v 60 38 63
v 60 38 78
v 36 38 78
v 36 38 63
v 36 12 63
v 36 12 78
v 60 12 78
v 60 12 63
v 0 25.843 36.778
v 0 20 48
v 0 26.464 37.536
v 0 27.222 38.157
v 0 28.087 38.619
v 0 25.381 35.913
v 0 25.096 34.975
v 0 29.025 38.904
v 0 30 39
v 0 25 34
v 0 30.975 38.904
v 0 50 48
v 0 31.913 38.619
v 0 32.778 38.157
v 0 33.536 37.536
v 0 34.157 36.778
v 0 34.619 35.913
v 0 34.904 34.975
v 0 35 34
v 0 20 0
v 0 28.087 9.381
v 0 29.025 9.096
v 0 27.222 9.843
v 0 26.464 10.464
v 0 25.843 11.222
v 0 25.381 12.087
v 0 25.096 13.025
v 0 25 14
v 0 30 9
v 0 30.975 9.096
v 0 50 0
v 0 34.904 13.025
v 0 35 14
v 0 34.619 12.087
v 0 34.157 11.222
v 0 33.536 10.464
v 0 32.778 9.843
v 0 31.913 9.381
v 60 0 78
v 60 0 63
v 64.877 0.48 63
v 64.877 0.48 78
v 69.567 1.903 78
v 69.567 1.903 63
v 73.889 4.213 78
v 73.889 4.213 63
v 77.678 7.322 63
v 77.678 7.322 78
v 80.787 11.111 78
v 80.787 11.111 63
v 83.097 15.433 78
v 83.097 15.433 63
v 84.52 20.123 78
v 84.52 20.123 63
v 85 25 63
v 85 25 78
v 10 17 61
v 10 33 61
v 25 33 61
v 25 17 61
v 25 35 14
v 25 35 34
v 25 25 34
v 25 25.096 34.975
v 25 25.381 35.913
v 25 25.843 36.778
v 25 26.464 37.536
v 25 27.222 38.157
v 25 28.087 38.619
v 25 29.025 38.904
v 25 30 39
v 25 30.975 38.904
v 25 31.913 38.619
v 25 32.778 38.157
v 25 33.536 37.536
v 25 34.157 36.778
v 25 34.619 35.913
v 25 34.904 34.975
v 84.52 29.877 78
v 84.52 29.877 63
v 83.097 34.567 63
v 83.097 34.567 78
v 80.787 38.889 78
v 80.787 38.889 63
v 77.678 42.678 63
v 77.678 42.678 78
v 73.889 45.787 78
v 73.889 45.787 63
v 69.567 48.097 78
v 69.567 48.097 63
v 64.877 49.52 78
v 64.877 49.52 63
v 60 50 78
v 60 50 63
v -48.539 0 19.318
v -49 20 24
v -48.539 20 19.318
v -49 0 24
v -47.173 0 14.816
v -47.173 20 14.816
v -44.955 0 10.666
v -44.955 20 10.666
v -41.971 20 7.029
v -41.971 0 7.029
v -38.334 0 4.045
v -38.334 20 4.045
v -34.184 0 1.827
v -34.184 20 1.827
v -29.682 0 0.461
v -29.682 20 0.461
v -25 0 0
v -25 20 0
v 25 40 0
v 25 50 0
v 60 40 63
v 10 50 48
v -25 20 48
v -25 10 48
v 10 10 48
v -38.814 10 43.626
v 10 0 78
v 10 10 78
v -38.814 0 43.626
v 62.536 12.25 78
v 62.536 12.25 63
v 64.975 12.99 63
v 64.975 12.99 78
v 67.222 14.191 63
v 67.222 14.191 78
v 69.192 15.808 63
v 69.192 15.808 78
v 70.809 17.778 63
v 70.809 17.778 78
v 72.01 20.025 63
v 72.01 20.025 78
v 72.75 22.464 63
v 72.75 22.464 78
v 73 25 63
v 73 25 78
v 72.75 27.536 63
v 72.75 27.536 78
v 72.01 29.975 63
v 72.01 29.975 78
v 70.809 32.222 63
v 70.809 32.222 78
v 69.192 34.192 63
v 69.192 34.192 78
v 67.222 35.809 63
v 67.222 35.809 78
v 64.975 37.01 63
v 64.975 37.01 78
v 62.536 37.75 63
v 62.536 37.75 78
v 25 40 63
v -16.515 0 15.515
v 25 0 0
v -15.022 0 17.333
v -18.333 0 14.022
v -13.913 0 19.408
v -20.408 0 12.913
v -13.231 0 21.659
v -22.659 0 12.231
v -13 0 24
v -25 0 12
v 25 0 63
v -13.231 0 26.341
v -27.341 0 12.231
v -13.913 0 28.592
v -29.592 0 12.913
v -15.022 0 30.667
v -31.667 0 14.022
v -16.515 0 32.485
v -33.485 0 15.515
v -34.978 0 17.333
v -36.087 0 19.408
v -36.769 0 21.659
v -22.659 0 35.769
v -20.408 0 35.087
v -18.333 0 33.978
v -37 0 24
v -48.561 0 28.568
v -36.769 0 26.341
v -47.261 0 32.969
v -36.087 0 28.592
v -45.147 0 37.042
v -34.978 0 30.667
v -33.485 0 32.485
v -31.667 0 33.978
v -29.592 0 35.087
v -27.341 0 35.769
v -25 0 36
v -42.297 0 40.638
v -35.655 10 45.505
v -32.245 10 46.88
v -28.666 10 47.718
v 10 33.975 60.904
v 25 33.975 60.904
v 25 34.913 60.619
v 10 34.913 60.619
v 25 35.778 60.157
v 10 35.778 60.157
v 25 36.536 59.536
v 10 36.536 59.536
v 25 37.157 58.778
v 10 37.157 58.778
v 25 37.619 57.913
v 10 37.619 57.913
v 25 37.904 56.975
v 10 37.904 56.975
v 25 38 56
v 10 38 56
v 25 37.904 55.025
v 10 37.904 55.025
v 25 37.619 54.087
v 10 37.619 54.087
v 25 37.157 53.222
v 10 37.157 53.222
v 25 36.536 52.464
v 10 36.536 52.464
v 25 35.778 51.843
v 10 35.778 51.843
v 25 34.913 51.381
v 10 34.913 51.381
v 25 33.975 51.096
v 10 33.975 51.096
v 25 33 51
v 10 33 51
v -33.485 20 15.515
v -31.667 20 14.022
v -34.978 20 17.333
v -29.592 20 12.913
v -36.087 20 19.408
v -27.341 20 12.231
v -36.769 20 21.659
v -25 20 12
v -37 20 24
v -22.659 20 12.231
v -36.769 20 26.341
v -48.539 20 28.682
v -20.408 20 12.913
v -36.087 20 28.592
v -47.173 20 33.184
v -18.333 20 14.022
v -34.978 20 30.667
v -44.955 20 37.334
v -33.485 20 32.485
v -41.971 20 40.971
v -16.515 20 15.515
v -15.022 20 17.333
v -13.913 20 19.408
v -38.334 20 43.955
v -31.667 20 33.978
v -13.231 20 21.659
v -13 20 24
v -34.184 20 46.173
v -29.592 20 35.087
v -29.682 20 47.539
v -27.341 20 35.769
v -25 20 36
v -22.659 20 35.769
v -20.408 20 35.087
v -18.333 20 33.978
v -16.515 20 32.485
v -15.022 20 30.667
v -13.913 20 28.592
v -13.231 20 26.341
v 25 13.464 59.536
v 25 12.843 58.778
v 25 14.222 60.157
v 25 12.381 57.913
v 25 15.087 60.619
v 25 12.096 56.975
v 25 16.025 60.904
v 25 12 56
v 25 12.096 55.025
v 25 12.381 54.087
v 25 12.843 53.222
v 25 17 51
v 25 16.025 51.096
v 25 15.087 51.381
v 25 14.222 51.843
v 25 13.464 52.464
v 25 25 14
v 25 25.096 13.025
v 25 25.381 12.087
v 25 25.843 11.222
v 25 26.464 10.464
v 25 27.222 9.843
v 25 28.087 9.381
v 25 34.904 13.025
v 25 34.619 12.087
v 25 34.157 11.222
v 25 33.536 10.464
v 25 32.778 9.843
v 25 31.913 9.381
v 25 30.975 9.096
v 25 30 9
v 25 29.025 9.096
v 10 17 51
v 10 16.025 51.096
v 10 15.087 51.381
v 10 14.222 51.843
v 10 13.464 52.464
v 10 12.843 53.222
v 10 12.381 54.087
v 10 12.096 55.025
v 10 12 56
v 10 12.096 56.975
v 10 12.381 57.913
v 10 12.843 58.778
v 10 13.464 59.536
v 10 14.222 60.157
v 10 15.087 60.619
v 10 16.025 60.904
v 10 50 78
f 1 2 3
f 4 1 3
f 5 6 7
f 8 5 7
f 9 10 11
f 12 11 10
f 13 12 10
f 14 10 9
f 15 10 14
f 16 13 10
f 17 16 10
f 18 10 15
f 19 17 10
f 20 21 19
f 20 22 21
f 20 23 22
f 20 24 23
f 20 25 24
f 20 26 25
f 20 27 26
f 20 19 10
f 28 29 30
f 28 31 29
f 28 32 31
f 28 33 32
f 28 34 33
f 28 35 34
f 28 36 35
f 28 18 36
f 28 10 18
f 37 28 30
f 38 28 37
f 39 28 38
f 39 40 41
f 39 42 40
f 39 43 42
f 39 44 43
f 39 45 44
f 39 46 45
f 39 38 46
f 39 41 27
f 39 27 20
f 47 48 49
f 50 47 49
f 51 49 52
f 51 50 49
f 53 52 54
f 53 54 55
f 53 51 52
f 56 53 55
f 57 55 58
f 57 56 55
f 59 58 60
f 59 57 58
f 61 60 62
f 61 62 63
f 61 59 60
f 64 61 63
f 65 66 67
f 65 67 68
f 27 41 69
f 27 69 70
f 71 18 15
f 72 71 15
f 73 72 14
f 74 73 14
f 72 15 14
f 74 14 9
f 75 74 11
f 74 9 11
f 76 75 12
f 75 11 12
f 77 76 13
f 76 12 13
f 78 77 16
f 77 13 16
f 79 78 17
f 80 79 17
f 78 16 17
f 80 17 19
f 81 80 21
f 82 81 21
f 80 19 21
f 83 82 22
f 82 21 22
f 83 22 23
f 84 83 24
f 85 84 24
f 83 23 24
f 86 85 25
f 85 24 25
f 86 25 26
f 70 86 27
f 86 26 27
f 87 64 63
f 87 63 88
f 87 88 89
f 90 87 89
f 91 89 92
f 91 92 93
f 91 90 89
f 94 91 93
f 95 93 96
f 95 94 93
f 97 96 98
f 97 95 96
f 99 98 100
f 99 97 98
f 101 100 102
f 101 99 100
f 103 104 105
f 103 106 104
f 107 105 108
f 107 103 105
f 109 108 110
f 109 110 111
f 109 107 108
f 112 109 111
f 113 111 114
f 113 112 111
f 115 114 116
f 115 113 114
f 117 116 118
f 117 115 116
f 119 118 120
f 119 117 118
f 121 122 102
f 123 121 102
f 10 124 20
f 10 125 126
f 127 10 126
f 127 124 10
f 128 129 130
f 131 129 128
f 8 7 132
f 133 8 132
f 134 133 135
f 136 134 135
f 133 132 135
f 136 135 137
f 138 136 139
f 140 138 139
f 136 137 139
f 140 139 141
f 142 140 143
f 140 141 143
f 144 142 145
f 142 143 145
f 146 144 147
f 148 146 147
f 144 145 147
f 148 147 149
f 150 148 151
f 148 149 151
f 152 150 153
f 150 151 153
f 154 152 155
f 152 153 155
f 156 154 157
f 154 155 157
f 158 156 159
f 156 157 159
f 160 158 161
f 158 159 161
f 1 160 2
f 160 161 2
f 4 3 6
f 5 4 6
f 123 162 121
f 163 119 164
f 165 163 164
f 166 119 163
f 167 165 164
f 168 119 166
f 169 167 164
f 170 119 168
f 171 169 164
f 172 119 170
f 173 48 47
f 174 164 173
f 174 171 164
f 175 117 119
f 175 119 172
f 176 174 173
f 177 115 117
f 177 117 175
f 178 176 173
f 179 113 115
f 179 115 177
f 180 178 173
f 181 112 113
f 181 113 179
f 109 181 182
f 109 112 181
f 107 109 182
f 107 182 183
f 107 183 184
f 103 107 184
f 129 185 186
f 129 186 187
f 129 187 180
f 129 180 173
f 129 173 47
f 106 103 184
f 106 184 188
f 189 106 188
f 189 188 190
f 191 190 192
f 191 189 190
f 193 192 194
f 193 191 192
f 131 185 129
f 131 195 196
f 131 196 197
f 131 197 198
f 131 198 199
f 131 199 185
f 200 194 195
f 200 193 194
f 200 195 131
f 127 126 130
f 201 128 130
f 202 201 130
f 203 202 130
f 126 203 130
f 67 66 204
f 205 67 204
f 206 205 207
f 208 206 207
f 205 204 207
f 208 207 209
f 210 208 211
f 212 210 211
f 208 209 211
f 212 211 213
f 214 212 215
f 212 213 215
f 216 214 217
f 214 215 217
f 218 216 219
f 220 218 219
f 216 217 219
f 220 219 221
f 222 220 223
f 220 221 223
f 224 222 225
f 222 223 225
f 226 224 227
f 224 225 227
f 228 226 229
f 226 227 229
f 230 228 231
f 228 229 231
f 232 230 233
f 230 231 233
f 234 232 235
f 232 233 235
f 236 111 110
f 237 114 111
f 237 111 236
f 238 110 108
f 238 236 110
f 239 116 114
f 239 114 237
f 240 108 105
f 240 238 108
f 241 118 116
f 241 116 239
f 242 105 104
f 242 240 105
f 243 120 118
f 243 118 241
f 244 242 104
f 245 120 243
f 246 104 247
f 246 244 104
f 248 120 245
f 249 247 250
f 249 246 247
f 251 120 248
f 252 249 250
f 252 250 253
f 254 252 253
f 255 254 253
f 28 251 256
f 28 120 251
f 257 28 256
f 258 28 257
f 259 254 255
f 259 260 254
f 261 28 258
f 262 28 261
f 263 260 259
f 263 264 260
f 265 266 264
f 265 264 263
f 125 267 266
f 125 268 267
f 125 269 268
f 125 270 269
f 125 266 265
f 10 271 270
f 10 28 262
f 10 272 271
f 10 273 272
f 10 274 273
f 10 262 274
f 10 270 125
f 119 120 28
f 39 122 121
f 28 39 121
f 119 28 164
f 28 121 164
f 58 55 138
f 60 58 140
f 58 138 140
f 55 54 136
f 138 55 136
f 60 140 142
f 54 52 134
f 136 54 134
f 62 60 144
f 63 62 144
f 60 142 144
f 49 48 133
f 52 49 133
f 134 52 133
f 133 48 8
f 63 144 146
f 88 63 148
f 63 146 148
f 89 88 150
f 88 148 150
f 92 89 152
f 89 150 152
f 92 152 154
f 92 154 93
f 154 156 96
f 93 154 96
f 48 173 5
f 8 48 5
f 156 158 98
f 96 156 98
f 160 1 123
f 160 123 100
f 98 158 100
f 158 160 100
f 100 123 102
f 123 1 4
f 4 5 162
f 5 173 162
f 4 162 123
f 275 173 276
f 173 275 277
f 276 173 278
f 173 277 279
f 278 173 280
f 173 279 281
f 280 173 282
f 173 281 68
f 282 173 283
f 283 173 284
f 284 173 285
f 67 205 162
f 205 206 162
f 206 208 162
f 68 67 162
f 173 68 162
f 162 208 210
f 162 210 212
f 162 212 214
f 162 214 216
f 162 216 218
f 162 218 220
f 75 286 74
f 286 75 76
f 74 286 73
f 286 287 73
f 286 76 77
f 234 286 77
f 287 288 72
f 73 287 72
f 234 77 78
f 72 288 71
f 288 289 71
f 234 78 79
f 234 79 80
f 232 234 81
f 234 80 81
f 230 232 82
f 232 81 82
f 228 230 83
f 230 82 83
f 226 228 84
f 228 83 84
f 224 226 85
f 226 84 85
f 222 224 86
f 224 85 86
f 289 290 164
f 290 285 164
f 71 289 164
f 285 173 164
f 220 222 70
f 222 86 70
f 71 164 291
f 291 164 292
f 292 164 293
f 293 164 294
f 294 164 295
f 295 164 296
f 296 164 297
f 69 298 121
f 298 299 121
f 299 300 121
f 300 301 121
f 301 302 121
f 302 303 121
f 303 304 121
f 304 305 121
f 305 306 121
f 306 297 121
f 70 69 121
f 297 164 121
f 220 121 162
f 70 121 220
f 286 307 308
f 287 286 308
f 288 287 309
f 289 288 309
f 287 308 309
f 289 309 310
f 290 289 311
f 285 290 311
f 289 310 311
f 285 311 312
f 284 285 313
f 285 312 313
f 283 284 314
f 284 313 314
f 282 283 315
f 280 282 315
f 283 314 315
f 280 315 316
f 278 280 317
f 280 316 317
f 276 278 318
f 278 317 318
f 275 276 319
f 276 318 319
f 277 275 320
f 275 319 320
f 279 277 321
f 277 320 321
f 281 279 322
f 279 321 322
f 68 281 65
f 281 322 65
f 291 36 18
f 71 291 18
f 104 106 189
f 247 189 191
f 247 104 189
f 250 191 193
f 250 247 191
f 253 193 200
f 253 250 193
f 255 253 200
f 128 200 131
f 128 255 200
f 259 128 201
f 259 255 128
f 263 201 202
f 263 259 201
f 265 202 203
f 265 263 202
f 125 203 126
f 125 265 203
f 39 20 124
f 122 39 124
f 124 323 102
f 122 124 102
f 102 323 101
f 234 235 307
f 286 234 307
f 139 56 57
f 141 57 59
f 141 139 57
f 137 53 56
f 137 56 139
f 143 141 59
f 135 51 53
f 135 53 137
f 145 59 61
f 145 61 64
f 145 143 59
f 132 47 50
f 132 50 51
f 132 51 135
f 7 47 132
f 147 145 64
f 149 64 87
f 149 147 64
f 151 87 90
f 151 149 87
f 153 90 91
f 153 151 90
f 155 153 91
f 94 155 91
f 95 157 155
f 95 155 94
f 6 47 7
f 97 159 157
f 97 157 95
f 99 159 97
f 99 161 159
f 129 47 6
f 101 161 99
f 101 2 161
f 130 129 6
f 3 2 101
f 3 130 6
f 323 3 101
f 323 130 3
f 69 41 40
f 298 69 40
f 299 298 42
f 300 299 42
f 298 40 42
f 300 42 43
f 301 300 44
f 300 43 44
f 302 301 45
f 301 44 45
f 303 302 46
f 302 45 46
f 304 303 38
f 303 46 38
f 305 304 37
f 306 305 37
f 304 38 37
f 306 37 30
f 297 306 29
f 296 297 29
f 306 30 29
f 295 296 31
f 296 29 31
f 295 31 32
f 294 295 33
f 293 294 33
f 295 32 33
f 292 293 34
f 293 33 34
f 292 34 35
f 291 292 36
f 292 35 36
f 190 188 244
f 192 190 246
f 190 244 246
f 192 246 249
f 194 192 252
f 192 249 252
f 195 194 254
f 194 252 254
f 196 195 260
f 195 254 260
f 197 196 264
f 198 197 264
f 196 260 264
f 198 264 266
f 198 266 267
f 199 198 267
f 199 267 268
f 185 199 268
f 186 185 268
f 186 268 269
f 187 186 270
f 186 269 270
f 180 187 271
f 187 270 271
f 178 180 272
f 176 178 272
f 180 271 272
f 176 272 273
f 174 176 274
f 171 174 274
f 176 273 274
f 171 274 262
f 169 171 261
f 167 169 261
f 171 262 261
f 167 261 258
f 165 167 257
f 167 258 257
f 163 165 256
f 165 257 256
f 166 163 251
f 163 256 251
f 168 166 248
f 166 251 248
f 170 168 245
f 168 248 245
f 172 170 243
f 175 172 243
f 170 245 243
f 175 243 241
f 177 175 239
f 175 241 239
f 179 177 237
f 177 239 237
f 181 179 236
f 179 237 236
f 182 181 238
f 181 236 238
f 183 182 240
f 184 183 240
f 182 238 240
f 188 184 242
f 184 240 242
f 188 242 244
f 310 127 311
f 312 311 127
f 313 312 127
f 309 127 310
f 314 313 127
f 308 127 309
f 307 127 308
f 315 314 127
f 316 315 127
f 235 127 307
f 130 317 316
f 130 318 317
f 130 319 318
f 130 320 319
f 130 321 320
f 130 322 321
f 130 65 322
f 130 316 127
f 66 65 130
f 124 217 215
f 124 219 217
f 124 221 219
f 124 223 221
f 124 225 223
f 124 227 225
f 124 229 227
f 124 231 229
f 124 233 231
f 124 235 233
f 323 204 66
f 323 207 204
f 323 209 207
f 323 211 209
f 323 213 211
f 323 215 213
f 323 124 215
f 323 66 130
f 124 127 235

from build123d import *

# Parameters (mm, degrees)
SKETCH_W        = 25
SKETCH_H        = 50
PAD_DEPTH       = 78
SKETCH001_W     = 10
SKETCH001_H     = 30
POCKET_DEPTH    = 50
SKETCH002_W     = 20
SKETCH002_H     = 48
PAD001_DEPTH    = 49
FILLET_R        = 24
POCKET001_DEPTH = 20
SKETCH004_W     = 50
SKETCH004_H     = 15
PAD002_DEPTH    = 60
FILLET001_R     = 25
POCKET002_DEPTH = 15
SKETCH006_R     = 12
POCKET003_DEPTH = 20
POCKET004_DEPTH = 15
POCKET005_DEPTH = 15
POCKET006_DEPTH = 25
PAD003_DEPTH    = 10
PAD004_DEPTH    = 10


with BuildPart() as part:
    # Sketch → Pad (new body)
    with BuildSketch(Plane.XY):
        with Locations((12.5, 25)):
            Rectangle(SKETCH_W, SKETCH_H)
    extrude(amount=PAD_DEPTH)

    # Sketch001 (on Face3 of Pad) → Pocket (cut)
    with BuildSketch(Plane(origin=(0, 50, 0), x_dir=(-1, 0, 0), z_dir=(0, 1, 0))):
        with Locations((-5, 63)):
            Rectangle(SKETCH001_W, SKETCH001_H)
    extrude(amount=-POCKET_DEPTH, mode=Mode.SUBTRACT)

    # Sketch002 (on Face7 of Pocket) → Pad001 (join)
    with BuildSketch(Plane(origin=(0, 0, 0), x_dir=(0, -1, 0), z_dir=(-1, 0, 0))):
        with Locations((-10, 24)):
            Rectangle(SKETCH002_W, SKETCH002_H)
    extrude(amount=PAD001_DEPTH)

    # Fillet
    fillet_edges = [part.edges().sort_by_distance(p)[0] for p in [
        (-49, 10, 0),
    ]]
    fillet(fillet_edges, radius=FILLET_R)

    # Sketch003 (on Face8 of Fillet) → Pocket001 (cut)
    with BuildSketch(Plane(origin=(0, 20, 0), x_dir=(-1, 0, 0), z_dir=(0, 1, 0))):
        with BuildLine():
            ThreePointArc((49, 24), (41.970563, 40.970563), (25, 48))
            Line((25, 48), (49, 48))
            Line((49, 48), (49, 24))
        make_face()
    extrude(amount=-POCKET001_DEPTH, mode=Mode.SUBTRACT)

    # Sketch004 (on Face10 of Pocket001) → Pad002 (join)
    with BuildSketch(Plane.YZ.offset(25)):
        with Locations((25, 70.5)):
            Rectangle(SKETCH004_W, SKETCH004_H)
    extrude(amount=PAD002_DEPTH)

    # Fillet001
    fillet001_edges = [part.edges().sort_by_distance(p)[0] for p in [
        (85, 0, 70.5),
    ]]
    fillet(fillet001_edges, radius=FILLET001_R)

    # Sketch005 (on Face2 of Fillet001) → Pocket002 (cut)
    with BuildSketch(Plane.XY.offset(78)):
        with BuildLine():
            ThreePointArc((85, 25), (77.67767, 42.67767), (60, 50))
            Line((60, 50), (85, 50))
            Line((85, 50), (85, 25))
        make_face()
    extrude(amount=-POCKET002_DEPTH, mode=Mode.SUBTRACT)

    # Sketch006 (on Face20 of Pocket002) → Pocket003 (cut)
    with BuildSketch(Plane(origin=(0, 20, 0), x_dir=(-1, 0, 0), z_dir=(0, 1, 0))):
        with Locations((25, 24)):
            Circle(SKETCH006_R)
    extrude(amount=-POCKET003_DEPTH, mode=Mode.SUBTRACT)

    # Sketch007 (on Face2 of Pocket003) → Pocket004 (cut)
    with BuildSketch(Plane.XY.offset(78)):
        with BuildLine():
            ThreePointArc((60, 12), (73, 25), (60, 38))
            Line((60, 38), (36, 38))
            Line((36, 38), (36, 12))
            Line((36, 12), (60, 12))
        make_face()
    extrude(amount=-POCKET004_DEPTH, mode=Mode.SUBTRACT)

    # Sketch008 (on Face15 of Pocket004) → Pocket005 (cut)
    with BuildSketch(Plane(origin=(10, 0, 0), x_dir=(0, -1, 0), z_dir=(-1, 0, 0))):
        with BuildLine():
            ThreePointArc((-33, 61), (-38, 56), (-33, 51))
            Line((-33, 51), (-17, 51))
            ThreePointArc((-17, 51), (-12, 56), (-17, 61))
            Line((-33, 61), (-17, 61))
        make_face()
    extrude(amount=-POCKET005_DEPTH, mode=Mode.SUBTRACT)

    # Sketch009 (on Face19 of Pocket005) → Pocket006 (cut)
    with BuildSketch(Plane(origin=(0, 0, 0), x_dir=(0, -1, 0), z_dir=(-1, 0, 0))):
        with BuildLine():
            ThreePointArc((-35, 14), (-30, 9), (-25, 14))
            Line((-25, 14), (-25, 34))
            ThreePointArc((-25, 34), (-30, 39), (-35, 34))
            Line((-35, 14), (-35, 34))
        make_face()
    extrude(amount=-POCKET006_DEPTH, mode=Mode.SUBTRACT)

    # Sketch010 (on DatumPlane) → Pad003 (join)
    with BuildSketch(Plane.XZ):
        with BuildLine():
            Line((10, 48), (10, 78))
            Line((10, 78), (-38.818227, 43.622859))
            ThreePointArc((-25, 48), (-32.247461, 46.879561), (-38.818227, 43.622859))
            Line((10, 48), (-25, 48))
        make_face()
    extrude(amount=-PAD003_DEPTH)

    # Sketch011 (on DatumPlane) → Pad004 (join)
    with BuildSketch(Plane(origin=(0, 50, 0), x_dir=(-1, 0, 0), z_dir=(0, 1, 0))):
        Polygon((-60, 63), (-25, 63), (-25, 0), align=None)
    extrude(amount=-PAD004_DEPTH)


solid = part.part
